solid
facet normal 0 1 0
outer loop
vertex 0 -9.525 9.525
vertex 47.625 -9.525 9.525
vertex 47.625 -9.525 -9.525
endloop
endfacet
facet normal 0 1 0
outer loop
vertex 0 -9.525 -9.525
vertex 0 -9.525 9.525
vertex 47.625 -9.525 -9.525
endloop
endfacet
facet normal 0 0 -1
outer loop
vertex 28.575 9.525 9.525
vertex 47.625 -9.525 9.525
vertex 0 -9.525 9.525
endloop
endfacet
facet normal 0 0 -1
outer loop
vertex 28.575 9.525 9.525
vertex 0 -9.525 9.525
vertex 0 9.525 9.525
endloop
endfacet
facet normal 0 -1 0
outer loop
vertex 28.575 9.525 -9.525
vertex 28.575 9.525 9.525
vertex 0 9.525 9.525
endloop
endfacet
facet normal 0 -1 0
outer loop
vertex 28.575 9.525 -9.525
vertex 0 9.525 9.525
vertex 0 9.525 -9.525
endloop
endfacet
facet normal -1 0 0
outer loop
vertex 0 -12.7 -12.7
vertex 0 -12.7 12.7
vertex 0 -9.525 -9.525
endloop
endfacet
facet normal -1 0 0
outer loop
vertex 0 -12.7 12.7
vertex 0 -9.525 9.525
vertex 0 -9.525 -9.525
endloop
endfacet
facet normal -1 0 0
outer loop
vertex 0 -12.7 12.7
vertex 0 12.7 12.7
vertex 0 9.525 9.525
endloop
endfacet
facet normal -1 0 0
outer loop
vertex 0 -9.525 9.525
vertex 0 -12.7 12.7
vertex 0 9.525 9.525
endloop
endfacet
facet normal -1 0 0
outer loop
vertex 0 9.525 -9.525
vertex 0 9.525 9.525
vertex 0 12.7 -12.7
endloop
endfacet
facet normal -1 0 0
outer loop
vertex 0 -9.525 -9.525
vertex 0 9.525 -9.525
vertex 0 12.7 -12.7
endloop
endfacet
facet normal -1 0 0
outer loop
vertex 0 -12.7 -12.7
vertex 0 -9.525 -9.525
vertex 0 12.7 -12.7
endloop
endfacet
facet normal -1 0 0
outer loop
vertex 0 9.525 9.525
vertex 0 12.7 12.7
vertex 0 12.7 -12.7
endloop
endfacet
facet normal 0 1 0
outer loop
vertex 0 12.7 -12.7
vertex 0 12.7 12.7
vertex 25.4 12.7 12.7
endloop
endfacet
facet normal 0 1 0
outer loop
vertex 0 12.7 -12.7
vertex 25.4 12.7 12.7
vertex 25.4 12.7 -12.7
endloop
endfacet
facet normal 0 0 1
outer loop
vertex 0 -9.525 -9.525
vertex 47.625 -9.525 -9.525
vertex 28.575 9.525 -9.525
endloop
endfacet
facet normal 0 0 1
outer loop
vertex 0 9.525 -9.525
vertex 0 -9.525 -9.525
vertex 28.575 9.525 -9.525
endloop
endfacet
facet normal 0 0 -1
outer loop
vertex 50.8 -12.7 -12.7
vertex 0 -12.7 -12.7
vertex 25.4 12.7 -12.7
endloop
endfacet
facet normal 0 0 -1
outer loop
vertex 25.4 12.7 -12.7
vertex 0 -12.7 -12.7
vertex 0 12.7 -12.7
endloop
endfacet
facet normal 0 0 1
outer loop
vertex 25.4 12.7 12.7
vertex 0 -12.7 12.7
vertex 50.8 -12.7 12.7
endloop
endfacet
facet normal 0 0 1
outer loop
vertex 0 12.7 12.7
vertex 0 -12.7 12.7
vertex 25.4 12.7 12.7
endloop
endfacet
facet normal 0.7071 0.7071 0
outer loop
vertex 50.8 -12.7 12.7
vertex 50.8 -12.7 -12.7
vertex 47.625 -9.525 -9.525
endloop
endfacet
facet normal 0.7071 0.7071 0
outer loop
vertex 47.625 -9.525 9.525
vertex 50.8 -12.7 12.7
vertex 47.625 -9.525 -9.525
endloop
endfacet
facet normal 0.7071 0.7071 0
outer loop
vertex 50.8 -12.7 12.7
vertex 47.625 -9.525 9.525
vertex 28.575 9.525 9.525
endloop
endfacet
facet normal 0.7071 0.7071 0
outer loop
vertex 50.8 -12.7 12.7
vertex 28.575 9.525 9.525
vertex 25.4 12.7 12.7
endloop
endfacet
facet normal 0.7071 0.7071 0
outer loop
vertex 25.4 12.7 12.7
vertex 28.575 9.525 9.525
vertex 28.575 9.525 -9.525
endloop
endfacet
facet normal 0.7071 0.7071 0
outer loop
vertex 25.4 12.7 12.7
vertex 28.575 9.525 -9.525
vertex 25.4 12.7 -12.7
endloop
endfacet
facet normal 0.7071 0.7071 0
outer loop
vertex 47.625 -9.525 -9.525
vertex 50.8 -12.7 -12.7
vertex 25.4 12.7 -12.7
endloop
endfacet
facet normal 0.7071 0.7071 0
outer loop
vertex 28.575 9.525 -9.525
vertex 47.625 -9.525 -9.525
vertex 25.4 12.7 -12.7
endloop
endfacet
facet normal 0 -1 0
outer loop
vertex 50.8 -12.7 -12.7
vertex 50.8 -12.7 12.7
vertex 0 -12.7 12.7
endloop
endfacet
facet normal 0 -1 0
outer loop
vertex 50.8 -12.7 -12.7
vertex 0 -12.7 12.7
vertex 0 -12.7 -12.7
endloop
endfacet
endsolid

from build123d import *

# Parameters (mm, degrees)
SKETCH1_W           = 25.4
SKETCH1_H           = 25.4
SKETCH1_W_2         = 19.05
SKETCH1_H_2         = 19.05
BOSS_EXTRUDE1_DEPTH = 50.8
CUT_EXTRUDE1_DEPTH  = 26.4


with BuildPart() as part:
    # Sketch1 → Boss-Extrude1 (new body)
    with BuildSketch(Plane(origin=(0, 0, 0), x_dir=(0, 0, -1), z_dir=(1, 0, 0))):
        Rectangle(SKETCH1_W, SKETCH1_H)
        Rectangle(SKETCH1_W_2, SKETCH1_H_2, mode=Mode.SUBTRACT)
    extrude(amount=BOSS_EXTRUDE1_DEPTH)

    # Sketch2 → Cut-Extrude1 (cut, through all)
    with BuildSketch(Plane(origin=(0, 0, -12.7), x_dir=(-1, 0, 0), z_dir=(0, 0, -1))):
        Polygon((-50.8, -12.7), (-25.4, 12.7), (-50.8, 12.7), align=None)
    extrude(amount=-CUT_EXTRUDE1_DEPTH, mode=Mode.SUBTRACT)


solid = part.part
